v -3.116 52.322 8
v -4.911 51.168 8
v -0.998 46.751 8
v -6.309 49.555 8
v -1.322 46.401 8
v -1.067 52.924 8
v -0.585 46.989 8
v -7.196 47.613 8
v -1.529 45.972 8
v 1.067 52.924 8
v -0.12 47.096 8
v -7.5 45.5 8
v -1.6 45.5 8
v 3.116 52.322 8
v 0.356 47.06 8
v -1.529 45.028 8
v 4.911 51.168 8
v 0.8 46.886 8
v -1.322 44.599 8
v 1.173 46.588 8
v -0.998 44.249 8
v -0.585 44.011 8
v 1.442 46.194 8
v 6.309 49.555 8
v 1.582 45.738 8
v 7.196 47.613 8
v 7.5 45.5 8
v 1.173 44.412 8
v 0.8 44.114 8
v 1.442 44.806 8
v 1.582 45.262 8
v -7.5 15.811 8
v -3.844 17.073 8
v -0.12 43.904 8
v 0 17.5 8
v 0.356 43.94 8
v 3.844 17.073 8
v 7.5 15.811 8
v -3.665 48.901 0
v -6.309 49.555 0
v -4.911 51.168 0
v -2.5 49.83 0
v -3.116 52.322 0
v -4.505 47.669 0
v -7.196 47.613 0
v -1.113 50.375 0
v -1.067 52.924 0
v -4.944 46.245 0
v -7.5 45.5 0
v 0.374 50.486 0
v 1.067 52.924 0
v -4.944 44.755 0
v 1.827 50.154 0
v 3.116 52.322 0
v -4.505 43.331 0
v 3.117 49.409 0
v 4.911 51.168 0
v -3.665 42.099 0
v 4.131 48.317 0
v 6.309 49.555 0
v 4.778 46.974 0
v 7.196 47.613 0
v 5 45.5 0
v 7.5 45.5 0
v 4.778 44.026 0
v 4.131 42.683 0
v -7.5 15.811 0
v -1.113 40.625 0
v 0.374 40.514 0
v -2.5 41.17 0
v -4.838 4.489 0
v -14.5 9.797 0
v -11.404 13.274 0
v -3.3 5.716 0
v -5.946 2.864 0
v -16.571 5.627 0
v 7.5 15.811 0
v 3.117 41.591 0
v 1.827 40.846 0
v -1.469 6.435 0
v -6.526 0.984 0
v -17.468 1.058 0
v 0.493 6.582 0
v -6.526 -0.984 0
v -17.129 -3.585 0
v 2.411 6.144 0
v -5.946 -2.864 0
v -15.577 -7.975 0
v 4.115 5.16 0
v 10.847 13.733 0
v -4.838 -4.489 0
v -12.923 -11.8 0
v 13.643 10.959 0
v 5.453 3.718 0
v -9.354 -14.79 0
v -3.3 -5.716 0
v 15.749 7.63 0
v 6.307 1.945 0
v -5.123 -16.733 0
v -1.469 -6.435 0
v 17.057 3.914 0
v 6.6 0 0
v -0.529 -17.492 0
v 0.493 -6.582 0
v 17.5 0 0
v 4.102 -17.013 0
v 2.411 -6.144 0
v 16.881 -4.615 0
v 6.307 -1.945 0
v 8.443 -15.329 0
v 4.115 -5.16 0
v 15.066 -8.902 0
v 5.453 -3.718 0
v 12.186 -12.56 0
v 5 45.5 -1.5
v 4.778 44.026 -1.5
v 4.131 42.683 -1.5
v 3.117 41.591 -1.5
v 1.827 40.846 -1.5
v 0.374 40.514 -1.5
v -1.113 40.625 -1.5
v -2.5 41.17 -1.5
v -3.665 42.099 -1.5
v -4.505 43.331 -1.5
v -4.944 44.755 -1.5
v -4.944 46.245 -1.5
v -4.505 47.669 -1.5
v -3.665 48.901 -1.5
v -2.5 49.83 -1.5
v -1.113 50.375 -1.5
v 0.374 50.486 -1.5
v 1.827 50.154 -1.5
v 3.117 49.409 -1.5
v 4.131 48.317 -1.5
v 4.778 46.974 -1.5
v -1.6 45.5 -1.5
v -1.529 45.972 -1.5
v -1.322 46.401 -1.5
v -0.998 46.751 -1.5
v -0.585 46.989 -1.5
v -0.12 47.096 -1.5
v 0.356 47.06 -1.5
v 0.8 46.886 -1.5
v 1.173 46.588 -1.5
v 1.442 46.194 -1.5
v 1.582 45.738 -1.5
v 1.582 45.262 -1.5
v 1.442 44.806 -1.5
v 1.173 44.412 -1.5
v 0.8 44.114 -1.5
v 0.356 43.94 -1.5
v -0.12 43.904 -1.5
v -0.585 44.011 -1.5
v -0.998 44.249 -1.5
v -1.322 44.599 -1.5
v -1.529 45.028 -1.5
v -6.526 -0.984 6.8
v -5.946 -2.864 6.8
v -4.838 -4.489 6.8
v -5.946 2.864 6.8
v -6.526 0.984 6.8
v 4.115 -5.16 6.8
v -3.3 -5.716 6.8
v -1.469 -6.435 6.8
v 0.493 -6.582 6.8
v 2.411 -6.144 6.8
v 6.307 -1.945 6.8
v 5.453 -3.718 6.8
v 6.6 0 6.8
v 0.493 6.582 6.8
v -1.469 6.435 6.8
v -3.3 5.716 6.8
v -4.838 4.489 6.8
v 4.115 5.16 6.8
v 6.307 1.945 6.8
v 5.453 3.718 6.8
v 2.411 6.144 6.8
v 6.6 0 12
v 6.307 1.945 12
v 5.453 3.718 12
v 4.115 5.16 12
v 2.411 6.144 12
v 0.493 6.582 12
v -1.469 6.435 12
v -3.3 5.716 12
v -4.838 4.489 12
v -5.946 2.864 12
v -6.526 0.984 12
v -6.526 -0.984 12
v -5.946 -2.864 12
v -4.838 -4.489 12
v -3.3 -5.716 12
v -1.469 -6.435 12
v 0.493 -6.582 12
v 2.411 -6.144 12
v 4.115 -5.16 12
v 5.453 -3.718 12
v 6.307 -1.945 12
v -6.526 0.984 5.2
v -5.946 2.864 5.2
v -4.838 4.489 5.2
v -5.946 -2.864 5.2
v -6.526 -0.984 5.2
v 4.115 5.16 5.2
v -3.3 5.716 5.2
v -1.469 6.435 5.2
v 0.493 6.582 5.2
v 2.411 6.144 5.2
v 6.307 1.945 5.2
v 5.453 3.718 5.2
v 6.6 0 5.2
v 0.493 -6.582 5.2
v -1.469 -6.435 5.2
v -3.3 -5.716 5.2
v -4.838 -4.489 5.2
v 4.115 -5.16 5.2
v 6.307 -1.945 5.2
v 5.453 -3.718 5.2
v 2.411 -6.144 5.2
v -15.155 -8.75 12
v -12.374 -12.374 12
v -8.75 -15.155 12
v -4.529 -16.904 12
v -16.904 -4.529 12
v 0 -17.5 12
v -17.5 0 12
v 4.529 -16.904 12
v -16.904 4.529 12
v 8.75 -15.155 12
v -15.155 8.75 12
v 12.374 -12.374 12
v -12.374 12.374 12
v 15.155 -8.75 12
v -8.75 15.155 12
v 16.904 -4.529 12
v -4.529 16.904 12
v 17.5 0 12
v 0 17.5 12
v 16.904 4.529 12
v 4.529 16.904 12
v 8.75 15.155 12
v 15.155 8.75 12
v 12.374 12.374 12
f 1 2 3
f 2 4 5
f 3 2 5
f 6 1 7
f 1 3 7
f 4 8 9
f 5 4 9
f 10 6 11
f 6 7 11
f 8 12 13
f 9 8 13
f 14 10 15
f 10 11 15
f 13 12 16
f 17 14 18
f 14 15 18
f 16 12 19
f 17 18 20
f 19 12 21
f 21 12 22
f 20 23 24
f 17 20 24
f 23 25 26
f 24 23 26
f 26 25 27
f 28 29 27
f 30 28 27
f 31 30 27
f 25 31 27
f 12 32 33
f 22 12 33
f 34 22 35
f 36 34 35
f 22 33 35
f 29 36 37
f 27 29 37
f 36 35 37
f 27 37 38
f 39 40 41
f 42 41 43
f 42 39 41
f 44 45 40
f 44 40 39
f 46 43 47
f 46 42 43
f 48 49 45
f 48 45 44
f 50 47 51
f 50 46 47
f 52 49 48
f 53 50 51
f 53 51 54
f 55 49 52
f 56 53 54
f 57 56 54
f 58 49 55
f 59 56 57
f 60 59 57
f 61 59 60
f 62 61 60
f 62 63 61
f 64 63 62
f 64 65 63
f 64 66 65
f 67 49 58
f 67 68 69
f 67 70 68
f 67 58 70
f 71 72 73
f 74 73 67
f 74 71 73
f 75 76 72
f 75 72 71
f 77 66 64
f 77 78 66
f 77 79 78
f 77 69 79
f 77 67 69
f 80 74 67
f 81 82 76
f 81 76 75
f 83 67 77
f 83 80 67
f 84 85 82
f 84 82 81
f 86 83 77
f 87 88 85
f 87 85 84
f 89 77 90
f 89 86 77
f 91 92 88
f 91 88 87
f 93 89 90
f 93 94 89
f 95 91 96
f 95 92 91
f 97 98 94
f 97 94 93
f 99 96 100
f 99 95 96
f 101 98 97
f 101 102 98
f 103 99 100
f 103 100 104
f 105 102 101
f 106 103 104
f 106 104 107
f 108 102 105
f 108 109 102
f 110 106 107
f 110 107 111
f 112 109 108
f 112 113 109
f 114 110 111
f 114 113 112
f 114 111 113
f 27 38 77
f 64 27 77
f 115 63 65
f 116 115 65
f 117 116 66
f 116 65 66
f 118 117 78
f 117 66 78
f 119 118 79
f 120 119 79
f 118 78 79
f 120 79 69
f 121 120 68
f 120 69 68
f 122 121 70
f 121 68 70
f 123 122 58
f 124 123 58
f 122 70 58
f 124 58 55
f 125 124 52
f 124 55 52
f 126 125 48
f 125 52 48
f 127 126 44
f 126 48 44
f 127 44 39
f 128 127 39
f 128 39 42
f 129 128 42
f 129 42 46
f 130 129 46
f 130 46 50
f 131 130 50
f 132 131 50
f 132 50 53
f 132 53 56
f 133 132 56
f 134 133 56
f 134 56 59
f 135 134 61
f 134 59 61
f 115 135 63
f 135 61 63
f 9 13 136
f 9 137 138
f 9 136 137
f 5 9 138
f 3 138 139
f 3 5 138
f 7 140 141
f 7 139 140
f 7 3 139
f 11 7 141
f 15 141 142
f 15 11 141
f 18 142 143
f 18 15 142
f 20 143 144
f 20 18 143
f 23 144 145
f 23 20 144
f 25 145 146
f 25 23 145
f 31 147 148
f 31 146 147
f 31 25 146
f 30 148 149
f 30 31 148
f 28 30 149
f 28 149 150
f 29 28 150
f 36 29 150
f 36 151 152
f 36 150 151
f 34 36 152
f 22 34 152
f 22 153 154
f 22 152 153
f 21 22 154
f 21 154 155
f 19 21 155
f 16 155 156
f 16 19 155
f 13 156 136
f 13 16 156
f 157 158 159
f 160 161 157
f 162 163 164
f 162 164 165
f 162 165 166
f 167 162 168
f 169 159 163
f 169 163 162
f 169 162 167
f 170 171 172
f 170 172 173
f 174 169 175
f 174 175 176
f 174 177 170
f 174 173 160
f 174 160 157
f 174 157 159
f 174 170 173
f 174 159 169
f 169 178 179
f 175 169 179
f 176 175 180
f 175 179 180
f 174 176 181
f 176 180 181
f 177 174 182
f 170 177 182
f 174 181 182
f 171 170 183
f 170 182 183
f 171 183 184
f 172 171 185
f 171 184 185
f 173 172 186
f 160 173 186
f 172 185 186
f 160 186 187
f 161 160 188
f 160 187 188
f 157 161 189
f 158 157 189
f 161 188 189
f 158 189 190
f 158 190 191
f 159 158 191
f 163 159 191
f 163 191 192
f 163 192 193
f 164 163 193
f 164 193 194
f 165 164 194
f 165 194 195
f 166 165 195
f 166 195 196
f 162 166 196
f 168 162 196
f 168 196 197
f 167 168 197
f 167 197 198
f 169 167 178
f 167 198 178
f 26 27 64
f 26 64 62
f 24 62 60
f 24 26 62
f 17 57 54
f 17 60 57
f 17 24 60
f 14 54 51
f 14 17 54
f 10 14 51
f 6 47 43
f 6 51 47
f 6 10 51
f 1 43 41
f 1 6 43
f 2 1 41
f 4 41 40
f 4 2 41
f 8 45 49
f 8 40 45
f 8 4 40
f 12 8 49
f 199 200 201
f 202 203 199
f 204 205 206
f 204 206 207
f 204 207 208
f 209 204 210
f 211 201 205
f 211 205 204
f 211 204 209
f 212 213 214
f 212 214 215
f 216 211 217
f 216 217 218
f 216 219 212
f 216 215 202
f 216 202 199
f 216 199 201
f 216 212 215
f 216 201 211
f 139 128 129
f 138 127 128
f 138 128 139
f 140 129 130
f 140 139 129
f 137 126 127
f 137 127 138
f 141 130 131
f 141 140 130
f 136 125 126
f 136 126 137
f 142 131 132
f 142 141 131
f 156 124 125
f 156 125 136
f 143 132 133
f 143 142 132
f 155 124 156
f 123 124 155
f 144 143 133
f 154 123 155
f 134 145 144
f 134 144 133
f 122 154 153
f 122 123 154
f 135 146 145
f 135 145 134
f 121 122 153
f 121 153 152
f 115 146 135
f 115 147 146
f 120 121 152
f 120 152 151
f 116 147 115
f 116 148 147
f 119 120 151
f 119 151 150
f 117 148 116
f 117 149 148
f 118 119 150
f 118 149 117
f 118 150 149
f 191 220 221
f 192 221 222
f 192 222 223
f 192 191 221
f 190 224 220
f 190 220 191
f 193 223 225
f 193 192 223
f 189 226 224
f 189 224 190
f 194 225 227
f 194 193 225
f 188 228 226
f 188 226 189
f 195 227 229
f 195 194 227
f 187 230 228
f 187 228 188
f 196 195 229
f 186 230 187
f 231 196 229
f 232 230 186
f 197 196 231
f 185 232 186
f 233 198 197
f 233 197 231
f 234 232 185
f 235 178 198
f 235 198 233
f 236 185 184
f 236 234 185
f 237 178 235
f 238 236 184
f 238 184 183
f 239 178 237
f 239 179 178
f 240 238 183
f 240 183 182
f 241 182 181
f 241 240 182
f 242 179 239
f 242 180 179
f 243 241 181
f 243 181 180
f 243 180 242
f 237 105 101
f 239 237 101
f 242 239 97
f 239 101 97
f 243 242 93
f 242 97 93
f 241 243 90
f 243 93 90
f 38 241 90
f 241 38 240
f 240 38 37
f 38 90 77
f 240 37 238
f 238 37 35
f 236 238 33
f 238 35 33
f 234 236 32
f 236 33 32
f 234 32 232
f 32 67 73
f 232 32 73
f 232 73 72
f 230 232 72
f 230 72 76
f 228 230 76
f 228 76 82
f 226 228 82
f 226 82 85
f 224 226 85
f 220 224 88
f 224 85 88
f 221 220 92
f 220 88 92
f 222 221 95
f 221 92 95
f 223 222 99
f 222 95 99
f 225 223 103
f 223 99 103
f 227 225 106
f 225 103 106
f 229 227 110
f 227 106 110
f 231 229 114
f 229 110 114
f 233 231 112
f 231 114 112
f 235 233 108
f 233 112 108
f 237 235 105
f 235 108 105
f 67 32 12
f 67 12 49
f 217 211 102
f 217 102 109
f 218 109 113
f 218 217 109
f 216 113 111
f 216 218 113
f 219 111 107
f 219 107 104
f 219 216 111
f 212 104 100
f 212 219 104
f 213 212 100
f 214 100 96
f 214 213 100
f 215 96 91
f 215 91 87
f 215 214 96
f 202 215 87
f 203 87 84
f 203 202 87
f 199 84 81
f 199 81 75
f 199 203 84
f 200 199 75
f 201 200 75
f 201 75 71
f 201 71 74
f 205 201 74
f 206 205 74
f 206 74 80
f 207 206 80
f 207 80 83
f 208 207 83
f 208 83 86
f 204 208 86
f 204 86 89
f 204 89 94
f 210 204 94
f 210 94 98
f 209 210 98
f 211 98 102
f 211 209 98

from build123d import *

# Parameters (mm, degrees)
CROQUIS1_R                 = 17.5
SALIENTE_EXTRUIR1_DEPTH    = 12
CROQUIS2_W                 = 15
CROQUIS2_H                 = 8
SALIENTE_EXTRUIR2_DEPTH    = 38
CROQUIS3_W                 = 15
CROQUIS3_H                 = 8
SALIENTE_EXTRUIR3_DEPTH    = 15
REDONDEO1_RADIUS           = 7.5
REDONDEO1_LENGTH           = 8
CROQUIS4_R                 = 6.6
CORTAR_EXTRUIR1_DEPTH      = 5.2
CORTAR_EXTRUIR2_START      = -5.2
CROQUIS5_R                 = 6.6
CORTAR_EXTRUIR2_DEPTH      = 5.2
CROQUIS7_R                 = 5
SALIENTE_EXTRUIR4_DEPTH    = 1.5
CORTAR_EXTRUIR3_DEPTH      = 58.089841478
CORTAR_EXTRUIR3_DEPTH_BACK = 58.089841478
CROQUIS6_R                 = 1.6


with BuildPart() as part:
    # Croquis1 → Saliente-Extruir1 (new body)
    with BuildSketch(Plane.XY):
        Circle(CROQUIS1_R)
    extrude(amount=SALIENTE_EXTRUIR1_DEPTH)

    # Croquis2 → Saliente-Extruir2 (add)
    with BuildSketch(Plane(origin=(0, 0, 0), x_dir=(1, 0, 0), z_dir=(0, 1, 0))):
        with Locations((0, -4)):
            Rectangle(CROQUIS2_W, CROQUIS2_H)
    extrude(amount=SALIENTE_EXTRUIR2_DEPTH)

    # Croquis3 → Saliente-Extruir3 (add)
    with BuildSketch(Plane(origin=(0, 38, 0), x_dir=(1, 0, 0), z_dir=(0, 1, 0))):
        with Locations((0, -4)):
            Rectangle(CROQUIS3_W, CROQUIS3_H)
    extrude(amount=SALIENTE_EXTRUIR3_DEPTH)

    # Redondeo1: full round fillet: the end face becomes a half cylinder, R = half its width
    redondeo1_face = Plane((0, 53, 4), x_dir=(0, 0, 1), z_dir=(0, 1, 0))  # on the end face: x along it, z out of the body
    redondeo1_slab = redondeo1_face.offset(-REDONDEO1_RADIUS / 2) * Box(REDONDEO1_LENGTH, 2 * REDONDEO1_RADIUS, REDONDEO1_RADIUS, mode=Mode.PRIVATE)  # the body's end, R deep
    redondeo1_round = Plane((0, 45.5, 4), x_dir=(0, 1, 0), z_dir=(0, 0, 1)) * Cylinder(REDONDEO1_RADIUS, REDONDEO1_LENGTH, mode=Mode.PRIVATE)  # its axis R under the face
    add(redondeo1_slab - redondeo1_round, mode=Mode.SUBTRACT)

    # Croquis4 → Cortar-Extruir1 (cut)
    with BuildSketch(Plane.XY.offset(12)):
        Circle(CROQUIS4_R)
    extrude(amount=-CORTAR_EXTRUIR1_DEPTH, mode=Mode.SUBTRACT)

    # Croquis5 → Cortar-Extruir2 (cut)
    with BuildSketch(Plane(origin=(0, 0, 0), x_dir=(-1, 0, 0), z_dir=(0, 0, -1)).offset(CORTAR_EXTRUIR2_START)):
        with Locations(Location((0, 0, 0), (0, 0, 180))):
            Circle(CROQUIS5_R)
    extrude(amount=CORTAR_EXTRUIR2_DEPTH, mode=Mode.SUBTRACT)

    # Croquis7 → Saliente-Extruir4 (add)
    with BuildSketch(Plane(origin=(0, 0, 0), x_dir=(-1, 0, 0), z_dir=(0, 0, -1))):
        with Locations(Location((0, 45.5, 0), (0, 0, 180))):
            Circle(CROQUIS7_R)
    extrude(amount=SALIENTE_EXTRUIR4_DEPTH)

    # Croquis6 → Cortar-Extruir3 (cut, two sides: drawn at the far end of the back side and taken through both)
    with BuildSketch(Plane(origin=(0, 0, 0), x_dir=(-1, 0, 0), z_dir=(0, 0, -1)).offset(-CORTAR_EXTRUIR3_DEPTH_BACK)):
        with Locations((0, 45.5)):
            Circle(CROQUIS6_R)
    extrude(amount=CORTAR_EXTRUIR3_DEPTH + CORTAR_EXTRUIR3_DEPTH_BACK, mode=Mode.SUBTRACT)


solid = part.part
